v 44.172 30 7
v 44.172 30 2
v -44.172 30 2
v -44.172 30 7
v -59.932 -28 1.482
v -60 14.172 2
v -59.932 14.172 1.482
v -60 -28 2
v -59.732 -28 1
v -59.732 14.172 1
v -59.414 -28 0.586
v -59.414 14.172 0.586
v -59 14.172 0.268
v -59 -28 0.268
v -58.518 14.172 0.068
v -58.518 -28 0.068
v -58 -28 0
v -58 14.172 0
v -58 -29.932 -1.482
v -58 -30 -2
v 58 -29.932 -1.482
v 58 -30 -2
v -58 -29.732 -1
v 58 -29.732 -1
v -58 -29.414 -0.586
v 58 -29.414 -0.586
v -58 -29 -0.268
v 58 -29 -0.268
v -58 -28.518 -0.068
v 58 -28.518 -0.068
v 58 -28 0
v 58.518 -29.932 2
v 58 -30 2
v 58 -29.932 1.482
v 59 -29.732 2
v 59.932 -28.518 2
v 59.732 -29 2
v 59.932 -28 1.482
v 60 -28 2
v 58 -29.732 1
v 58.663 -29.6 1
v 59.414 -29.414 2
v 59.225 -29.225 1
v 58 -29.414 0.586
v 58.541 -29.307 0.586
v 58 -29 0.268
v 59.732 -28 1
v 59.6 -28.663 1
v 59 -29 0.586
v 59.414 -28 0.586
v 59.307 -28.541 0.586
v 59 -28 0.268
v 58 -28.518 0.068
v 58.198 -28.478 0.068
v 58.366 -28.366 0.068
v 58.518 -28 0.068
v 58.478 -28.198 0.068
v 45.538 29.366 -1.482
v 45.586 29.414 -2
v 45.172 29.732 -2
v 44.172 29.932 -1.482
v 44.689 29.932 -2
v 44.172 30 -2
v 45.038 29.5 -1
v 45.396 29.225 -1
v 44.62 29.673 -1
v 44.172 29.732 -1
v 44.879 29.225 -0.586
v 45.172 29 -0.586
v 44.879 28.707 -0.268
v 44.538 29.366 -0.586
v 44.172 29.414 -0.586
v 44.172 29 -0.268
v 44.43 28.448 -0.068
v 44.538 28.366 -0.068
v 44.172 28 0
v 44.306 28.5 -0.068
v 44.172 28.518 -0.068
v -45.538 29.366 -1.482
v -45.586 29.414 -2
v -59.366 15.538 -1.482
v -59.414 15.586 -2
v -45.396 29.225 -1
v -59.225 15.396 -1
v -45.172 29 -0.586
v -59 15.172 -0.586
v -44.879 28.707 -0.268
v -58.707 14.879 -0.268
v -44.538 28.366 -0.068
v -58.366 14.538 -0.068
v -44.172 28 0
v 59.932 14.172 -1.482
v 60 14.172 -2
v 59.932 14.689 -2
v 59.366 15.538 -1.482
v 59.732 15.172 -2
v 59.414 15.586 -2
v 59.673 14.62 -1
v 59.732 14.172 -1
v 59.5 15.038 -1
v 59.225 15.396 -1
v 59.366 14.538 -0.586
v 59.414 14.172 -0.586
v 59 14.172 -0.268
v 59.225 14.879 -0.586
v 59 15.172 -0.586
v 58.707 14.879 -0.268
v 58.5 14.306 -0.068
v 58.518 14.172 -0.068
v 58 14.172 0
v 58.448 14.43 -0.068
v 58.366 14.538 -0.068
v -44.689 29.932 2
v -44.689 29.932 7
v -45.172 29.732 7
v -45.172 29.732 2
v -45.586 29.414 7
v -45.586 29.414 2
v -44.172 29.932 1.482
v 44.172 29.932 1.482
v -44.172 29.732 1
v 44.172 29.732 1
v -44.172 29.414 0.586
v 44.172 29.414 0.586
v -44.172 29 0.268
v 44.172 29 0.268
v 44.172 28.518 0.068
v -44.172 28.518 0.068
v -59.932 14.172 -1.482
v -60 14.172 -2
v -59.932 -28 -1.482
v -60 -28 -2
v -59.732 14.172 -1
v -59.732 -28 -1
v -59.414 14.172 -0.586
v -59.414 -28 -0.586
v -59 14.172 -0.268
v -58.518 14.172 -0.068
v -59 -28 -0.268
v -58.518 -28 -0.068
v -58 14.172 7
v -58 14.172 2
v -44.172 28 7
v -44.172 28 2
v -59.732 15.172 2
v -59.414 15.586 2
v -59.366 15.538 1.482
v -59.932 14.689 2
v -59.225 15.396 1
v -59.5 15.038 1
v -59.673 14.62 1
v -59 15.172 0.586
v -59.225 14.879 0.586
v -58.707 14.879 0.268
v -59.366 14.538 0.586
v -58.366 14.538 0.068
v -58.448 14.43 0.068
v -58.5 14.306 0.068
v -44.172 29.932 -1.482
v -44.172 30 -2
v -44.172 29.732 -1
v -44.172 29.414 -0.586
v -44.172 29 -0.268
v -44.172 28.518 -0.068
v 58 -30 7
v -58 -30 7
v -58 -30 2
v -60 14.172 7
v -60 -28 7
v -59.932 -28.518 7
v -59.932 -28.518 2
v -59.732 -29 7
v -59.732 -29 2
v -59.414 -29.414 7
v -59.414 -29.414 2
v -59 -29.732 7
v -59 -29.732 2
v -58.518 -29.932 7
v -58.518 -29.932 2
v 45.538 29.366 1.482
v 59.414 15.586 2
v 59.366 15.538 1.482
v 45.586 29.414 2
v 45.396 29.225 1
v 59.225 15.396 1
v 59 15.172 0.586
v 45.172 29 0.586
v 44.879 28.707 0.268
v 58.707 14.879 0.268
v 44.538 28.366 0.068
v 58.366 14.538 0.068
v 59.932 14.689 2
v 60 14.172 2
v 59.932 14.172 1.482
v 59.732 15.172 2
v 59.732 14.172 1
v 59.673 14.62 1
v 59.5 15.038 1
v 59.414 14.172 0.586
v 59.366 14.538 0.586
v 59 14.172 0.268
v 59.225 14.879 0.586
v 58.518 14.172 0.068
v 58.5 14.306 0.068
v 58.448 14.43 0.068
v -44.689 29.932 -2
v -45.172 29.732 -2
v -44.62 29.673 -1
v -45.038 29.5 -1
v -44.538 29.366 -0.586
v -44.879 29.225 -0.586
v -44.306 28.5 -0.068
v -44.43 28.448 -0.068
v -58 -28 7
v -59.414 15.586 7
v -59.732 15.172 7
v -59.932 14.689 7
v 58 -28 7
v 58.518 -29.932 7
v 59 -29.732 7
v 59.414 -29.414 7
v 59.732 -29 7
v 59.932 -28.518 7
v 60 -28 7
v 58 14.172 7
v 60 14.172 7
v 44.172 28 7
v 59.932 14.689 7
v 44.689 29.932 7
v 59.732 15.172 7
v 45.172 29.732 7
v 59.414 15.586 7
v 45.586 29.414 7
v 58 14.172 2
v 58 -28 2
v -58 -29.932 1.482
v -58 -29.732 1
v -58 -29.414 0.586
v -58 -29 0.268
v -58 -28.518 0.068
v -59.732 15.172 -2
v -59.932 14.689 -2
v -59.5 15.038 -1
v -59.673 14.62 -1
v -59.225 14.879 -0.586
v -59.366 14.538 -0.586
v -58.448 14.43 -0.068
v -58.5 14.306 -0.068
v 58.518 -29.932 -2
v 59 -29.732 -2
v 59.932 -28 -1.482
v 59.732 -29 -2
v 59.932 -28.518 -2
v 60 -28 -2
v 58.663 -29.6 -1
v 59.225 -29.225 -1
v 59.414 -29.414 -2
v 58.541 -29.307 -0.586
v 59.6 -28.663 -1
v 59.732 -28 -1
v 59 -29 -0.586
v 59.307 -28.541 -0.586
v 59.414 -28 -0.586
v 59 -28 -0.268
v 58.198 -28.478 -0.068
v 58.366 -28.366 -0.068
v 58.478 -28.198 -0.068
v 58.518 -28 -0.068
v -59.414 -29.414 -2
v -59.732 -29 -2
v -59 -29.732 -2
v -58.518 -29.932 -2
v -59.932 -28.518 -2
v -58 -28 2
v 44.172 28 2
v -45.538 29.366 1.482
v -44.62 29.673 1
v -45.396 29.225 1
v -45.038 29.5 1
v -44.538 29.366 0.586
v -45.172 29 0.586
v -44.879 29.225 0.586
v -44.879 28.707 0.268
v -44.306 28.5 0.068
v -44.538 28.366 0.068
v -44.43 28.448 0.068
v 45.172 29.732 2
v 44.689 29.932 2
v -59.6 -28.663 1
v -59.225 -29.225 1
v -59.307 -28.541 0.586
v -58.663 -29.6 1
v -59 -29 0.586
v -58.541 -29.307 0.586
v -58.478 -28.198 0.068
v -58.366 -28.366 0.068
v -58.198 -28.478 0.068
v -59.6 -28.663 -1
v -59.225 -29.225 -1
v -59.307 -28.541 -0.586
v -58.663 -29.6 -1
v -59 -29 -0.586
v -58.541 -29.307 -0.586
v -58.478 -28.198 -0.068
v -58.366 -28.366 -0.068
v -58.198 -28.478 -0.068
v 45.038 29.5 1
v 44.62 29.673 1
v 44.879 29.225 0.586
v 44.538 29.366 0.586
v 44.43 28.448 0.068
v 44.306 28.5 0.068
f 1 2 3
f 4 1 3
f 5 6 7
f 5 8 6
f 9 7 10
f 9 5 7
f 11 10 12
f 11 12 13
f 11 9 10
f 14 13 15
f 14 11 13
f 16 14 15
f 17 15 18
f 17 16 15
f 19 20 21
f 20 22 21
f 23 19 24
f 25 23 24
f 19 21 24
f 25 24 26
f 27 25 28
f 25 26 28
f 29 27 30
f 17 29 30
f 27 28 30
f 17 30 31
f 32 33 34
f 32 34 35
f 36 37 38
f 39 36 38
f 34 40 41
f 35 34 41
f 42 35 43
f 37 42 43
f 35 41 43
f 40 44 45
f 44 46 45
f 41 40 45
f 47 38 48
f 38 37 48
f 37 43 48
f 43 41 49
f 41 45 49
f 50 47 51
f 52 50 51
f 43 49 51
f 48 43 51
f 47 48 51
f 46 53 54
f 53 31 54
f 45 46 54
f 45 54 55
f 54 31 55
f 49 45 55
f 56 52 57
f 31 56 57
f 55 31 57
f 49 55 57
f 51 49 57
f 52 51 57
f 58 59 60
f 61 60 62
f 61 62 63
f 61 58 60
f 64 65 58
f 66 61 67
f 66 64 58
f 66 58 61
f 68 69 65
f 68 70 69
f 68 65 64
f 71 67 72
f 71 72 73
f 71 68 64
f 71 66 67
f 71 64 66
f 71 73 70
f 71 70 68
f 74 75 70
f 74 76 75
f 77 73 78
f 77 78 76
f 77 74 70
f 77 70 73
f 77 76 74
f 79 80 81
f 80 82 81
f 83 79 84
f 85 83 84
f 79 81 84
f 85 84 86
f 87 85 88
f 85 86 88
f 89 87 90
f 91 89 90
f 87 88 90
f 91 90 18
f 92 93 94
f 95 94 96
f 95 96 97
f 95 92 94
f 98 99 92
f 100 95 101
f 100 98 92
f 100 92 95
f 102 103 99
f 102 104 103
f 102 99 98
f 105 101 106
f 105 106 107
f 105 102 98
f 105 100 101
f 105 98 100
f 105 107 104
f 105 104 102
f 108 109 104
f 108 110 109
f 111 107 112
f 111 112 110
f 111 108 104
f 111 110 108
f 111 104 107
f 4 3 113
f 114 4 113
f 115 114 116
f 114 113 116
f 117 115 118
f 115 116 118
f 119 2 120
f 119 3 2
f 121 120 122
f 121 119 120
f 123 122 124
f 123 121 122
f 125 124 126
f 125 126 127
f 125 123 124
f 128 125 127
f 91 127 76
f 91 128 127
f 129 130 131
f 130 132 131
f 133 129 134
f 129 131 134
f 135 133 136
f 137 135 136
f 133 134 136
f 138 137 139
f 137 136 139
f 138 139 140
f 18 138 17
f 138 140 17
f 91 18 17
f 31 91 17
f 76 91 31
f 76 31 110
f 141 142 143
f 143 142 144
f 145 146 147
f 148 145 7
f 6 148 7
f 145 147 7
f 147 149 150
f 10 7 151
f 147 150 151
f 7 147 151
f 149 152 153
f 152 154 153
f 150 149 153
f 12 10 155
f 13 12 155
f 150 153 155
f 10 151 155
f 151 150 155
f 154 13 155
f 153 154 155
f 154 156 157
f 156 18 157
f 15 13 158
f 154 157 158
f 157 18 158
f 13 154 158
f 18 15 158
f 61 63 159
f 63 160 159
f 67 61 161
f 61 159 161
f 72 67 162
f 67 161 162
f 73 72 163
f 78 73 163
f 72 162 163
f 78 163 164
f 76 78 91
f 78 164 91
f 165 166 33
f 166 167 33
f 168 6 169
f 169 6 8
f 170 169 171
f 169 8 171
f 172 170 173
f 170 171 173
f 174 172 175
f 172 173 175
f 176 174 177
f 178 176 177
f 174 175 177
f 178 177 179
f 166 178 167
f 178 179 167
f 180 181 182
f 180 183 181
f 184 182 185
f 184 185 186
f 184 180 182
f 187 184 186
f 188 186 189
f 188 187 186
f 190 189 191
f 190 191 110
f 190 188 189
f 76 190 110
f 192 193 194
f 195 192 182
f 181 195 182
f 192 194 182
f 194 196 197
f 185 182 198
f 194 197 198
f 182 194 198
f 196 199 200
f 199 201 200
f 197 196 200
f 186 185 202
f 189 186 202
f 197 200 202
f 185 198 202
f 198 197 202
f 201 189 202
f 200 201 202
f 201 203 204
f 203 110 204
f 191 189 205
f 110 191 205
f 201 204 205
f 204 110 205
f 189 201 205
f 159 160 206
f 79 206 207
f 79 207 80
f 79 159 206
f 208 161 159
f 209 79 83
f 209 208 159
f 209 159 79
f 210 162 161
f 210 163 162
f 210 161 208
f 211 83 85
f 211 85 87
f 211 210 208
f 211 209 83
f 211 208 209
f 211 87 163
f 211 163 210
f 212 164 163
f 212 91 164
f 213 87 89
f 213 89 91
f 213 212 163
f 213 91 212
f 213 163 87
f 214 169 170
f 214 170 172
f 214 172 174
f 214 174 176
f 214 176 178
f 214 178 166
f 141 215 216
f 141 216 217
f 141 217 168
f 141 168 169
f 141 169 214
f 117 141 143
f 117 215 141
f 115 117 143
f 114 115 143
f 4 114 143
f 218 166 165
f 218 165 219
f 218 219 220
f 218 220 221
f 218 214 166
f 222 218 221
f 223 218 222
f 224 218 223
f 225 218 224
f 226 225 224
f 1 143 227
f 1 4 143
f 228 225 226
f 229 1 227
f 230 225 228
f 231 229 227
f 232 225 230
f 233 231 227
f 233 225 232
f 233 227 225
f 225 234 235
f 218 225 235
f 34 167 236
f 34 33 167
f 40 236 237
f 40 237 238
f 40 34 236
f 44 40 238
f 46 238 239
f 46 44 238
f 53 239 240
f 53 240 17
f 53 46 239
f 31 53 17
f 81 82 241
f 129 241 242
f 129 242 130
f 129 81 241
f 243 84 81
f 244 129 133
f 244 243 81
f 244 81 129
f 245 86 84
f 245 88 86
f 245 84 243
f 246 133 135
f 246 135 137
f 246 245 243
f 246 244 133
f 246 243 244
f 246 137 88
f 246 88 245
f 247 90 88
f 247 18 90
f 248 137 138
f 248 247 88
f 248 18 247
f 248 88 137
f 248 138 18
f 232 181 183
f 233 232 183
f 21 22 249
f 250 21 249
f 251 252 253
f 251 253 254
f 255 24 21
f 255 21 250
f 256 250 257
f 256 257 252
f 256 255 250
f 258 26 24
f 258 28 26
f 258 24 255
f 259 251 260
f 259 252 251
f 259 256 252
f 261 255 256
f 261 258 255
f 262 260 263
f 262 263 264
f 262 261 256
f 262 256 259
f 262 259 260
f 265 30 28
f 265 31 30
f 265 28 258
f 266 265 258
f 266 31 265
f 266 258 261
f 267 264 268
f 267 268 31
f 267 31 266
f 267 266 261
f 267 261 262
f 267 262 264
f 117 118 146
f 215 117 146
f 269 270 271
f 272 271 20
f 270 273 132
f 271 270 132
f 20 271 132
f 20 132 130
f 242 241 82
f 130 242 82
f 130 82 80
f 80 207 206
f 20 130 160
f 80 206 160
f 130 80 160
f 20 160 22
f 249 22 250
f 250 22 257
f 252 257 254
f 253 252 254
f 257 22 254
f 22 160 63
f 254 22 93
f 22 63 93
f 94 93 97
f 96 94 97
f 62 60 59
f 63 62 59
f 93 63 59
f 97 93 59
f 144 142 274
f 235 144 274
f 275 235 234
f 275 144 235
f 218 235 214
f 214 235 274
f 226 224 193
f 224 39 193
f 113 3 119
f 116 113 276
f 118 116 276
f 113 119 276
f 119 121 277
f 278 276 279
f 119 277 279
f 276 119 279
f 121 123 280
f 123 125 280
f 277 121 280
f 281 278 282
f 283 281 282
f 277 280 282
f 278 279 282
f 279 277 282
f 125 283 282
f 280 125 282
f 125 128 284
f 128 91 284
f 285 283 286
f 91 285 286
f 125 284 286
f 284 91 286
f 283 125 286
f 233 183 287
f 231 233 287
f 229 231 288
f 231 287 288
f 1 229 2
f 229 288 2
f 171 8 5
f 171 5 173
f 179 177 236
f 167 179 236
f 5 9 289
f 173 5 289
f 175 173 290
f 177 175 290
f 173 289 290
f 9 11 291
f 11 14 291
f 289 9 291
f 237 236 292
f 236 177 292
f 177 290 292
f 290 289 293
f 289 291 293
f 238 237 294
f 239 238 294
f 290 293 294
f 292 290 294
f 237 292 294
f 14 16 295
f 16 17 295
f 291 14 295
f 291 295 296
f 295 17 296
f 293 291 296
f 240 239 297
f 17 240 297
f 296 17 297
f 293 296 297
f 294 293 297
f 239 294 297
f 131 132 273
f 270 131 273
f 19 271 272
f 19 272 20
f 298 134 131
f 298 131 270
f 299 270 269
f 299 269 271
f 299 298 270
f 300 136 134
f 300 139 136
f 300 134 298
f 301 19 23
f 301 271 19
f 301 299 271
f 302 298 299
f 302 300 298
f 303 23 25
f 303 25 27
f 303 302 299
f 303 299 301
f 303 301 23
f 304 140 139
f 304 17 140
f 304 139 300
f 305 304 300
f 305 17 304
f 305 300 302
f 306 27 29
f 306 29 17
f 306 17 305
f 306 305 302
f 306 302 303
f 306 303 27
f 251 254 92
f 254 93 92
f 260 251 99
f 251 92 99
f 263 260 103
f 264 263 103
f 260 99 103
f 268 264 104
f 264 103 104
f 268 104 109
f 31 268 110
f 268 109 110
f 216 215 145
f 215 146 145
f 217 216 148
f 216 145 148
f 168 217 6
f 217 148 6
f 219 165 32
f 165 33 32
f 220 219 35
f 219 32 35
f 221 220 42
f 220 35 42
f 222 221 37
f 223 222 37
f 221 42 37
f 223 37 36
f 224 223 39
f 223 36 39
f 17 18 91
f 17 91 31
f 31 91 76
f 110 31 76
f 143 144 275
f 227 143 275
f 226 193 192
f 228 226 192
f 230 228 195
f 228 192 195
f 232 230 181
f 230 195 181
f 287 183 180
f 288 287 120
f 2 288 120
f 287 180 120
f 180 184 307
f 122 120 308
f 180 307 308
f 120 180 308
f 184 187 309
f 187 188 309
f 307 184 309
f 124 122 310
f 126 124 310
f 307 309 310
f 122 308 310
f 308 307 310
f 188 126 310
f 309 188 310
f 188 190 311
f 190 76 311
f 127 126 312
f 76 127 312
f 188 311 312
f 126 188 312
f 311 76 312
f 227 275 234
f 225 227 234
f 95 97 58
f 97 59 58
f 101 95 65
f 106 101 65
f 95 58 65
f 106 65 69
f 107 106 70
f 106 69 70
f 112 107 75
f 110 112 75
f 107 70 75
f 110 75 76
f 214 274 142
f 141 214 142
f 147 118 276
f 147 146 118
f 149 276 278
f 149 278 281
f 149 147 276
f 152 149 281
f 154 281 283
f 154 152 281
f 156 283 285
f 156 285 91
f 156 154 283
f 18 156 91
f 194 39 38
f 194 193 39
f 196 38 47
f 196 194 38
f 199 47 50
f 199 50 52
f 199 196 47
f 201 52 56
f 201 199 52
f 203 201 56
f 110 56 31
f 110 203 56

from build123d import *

# Parameters (mm, degrees)
F1_DEPTH = 2
F2_R     = 1.99999
F4_DEPTH = 5
F5_DEPTH = 2
F6_R     = 1.99999


# Not quite as in the source:
# - a fillet or chamfer is up to 0.001 mm smaller than in the source, because OpenCascade refuses the exact size


with BuildPart() as f1:
    # F0 (on Top) → F1 (new body)
    with BuildSketch(Plane.XY):
        with BuildLine():
            ThreePointArc((-60, -28), (-59.4142135624, -29.4142135624), (-58, -30))
            Line((-58, -30), (58, -30))
            ThreePointArc((58, -30), (59.4142135624, -29.4142135624), (60, -28))
            Line((60, -28), (60, 14.1715728753))
            ThreePointArc((60, 14.1715728753), (59.847759065, 14.93693974), (59.4142135624, 15.5857864376))
            Line((59.4142135624, 15.5857864376), (45.5857864376, 29.4142135624))
            ThreePointArc((45.5857864376, 29.4142135624), (44.93693974, 29.847759065), (44.1715728753, 30))
            Line((44.1715728753, 30), (-44.1715728753, 30))
            ThreePointArc((-44.1715728753, 30), (-44.93693974, 29.847759065), (-45.5857864376, 29.4142135624))
            Line((-45.5857864376, 29.4142135624), (-59.4142135624, 15.5857864376))
            ThreePointArc((-59.4142135624, 15.5857864376), (-59.847759065, 14.93693974), (-60, 14.1715728753))
            Line((-60, 14.1715728753), (-60, -28))
        make_face()
    extrude(amount=F1_DEPTH)

    # F2 (radius 2 in the source; OpenCascade refuses exactly that, so slightly less here)
    f2_edges = [f1.edges().sort_by_distance(p)[0] for p in [
        (0, -30, 0),
        (-60, -6.914214, 0),
        (0, 30, 0),
        (52.5, 22.5, 0),
        (60, -6.914214, 0),
        (-52.5, 22.5, 0),
    ]]
    fillet(f2_edges, radius=F2_R)

    # F3 (on face) → F4 (join)
    with BuildSketch(Plane.XY.offset(2)):
        with BuildLine():
            Line((-45.5857864376, 29.4142135624), (-59.4142135624, 15.5857864376))
            ThreePointArc((-59.4142135624, 15.5857864376), (-59.847759065, 14.93693974), (-60, 14.1715728753))
            Line((-60, 14.1715728753), (-60, -28))
            ThreePointArc((-60, -28), (-59.4142135624, -29.4142135624), (-58, -30))
            Line((-58, -30), (58, -30))
            ThreePointArc((58, -30), (59.4142135624, -29.4142135624), (60, -28))
            Line((60, -28), (60, 14.1715728753))
            ThreePointArc((60, 14.1715728753), (59.847759065, 14.93693974), (59.4142135624, 15.5857864376))
            Line((59.4142135624, 15.5857864376), (45.5857864376, 29.4142135624))
            ThreePointArc((45.5857864376, 29.4142135624), (44.93693974, 29.847759065), (44.1715728753, 30))
            Line((44.1715728753, 30), (-44.1715728753, 30))
            ThreePointArc((-44.1715728753, 30), (-44.93693974, 29.847759065), (-45.5857864376, 29.4142135624))
        make_face()
        Polygon((-44.1715728753, 28), (44.1715728753, 28), (58, 14.1715728753), (58, -28), (-58, -28), (-58, 14.1715728753), align=None, mode=Mode.SUBTRACT)
    extrude(amount=F4_DEPTH)


with BuildPart() as f5:
    # F0 (on Top) → F5 (new body)
    with BuildSketch(Plane.XY):
        with BuildLine():
            ThreePointArc((-60, -28), (-59.4142135624, -29.4142135624), (-58, -30))
            Line((-58, -30), (58, -30))
            ThreePointArc((58, -30), (59.4142135624, -29.4142135624), (60, -28))
            Line((60, -28), (60, 14.1715728753))
            ThreePointArc((60, 14.1715728753), (59.847759065, 14.93693974), (59.4142135624, 15.5857864376))
            Line((59.4142135624, 15.5857864376), (45.5857864376, 29.4142135624))
            ThreePointArc((45.5857864376, 29.4142135624), (44.93693974, 29.847759065), (44.1715728753, 30))
            Line((44.1715728753, 30), (-44.1715728753, 30))
            ThreePointArc((-44.1715728753, 30), (-44.93693974, 29.847759065), (-45.5857864376, 29.4142135624))
            Line((-45.5857864376, 29.4142135624), (-59.4142135624, 15.5857864376))
            ThreePointArc((-59.4142135624, 15.5857864376), (-59.847759065, 14.93693974), (-60, 14.1715728753))
            Line((-60, 14.1715728753), (-60, -28))
        make_face()
    extrude(amount=-F5_DEPTH)

    # F6 (radius 2 in the source; OpenCascade refuses exactly that, so slightly less here)
    f6_edges = [f5.edges().sort_by_distance(p)[0] for p in [
        (-60, -6.914214, 0),
    ]]
    fillet(f6_edges, radius=F6_R)


solid = Compound([f1.part, f5.part])
